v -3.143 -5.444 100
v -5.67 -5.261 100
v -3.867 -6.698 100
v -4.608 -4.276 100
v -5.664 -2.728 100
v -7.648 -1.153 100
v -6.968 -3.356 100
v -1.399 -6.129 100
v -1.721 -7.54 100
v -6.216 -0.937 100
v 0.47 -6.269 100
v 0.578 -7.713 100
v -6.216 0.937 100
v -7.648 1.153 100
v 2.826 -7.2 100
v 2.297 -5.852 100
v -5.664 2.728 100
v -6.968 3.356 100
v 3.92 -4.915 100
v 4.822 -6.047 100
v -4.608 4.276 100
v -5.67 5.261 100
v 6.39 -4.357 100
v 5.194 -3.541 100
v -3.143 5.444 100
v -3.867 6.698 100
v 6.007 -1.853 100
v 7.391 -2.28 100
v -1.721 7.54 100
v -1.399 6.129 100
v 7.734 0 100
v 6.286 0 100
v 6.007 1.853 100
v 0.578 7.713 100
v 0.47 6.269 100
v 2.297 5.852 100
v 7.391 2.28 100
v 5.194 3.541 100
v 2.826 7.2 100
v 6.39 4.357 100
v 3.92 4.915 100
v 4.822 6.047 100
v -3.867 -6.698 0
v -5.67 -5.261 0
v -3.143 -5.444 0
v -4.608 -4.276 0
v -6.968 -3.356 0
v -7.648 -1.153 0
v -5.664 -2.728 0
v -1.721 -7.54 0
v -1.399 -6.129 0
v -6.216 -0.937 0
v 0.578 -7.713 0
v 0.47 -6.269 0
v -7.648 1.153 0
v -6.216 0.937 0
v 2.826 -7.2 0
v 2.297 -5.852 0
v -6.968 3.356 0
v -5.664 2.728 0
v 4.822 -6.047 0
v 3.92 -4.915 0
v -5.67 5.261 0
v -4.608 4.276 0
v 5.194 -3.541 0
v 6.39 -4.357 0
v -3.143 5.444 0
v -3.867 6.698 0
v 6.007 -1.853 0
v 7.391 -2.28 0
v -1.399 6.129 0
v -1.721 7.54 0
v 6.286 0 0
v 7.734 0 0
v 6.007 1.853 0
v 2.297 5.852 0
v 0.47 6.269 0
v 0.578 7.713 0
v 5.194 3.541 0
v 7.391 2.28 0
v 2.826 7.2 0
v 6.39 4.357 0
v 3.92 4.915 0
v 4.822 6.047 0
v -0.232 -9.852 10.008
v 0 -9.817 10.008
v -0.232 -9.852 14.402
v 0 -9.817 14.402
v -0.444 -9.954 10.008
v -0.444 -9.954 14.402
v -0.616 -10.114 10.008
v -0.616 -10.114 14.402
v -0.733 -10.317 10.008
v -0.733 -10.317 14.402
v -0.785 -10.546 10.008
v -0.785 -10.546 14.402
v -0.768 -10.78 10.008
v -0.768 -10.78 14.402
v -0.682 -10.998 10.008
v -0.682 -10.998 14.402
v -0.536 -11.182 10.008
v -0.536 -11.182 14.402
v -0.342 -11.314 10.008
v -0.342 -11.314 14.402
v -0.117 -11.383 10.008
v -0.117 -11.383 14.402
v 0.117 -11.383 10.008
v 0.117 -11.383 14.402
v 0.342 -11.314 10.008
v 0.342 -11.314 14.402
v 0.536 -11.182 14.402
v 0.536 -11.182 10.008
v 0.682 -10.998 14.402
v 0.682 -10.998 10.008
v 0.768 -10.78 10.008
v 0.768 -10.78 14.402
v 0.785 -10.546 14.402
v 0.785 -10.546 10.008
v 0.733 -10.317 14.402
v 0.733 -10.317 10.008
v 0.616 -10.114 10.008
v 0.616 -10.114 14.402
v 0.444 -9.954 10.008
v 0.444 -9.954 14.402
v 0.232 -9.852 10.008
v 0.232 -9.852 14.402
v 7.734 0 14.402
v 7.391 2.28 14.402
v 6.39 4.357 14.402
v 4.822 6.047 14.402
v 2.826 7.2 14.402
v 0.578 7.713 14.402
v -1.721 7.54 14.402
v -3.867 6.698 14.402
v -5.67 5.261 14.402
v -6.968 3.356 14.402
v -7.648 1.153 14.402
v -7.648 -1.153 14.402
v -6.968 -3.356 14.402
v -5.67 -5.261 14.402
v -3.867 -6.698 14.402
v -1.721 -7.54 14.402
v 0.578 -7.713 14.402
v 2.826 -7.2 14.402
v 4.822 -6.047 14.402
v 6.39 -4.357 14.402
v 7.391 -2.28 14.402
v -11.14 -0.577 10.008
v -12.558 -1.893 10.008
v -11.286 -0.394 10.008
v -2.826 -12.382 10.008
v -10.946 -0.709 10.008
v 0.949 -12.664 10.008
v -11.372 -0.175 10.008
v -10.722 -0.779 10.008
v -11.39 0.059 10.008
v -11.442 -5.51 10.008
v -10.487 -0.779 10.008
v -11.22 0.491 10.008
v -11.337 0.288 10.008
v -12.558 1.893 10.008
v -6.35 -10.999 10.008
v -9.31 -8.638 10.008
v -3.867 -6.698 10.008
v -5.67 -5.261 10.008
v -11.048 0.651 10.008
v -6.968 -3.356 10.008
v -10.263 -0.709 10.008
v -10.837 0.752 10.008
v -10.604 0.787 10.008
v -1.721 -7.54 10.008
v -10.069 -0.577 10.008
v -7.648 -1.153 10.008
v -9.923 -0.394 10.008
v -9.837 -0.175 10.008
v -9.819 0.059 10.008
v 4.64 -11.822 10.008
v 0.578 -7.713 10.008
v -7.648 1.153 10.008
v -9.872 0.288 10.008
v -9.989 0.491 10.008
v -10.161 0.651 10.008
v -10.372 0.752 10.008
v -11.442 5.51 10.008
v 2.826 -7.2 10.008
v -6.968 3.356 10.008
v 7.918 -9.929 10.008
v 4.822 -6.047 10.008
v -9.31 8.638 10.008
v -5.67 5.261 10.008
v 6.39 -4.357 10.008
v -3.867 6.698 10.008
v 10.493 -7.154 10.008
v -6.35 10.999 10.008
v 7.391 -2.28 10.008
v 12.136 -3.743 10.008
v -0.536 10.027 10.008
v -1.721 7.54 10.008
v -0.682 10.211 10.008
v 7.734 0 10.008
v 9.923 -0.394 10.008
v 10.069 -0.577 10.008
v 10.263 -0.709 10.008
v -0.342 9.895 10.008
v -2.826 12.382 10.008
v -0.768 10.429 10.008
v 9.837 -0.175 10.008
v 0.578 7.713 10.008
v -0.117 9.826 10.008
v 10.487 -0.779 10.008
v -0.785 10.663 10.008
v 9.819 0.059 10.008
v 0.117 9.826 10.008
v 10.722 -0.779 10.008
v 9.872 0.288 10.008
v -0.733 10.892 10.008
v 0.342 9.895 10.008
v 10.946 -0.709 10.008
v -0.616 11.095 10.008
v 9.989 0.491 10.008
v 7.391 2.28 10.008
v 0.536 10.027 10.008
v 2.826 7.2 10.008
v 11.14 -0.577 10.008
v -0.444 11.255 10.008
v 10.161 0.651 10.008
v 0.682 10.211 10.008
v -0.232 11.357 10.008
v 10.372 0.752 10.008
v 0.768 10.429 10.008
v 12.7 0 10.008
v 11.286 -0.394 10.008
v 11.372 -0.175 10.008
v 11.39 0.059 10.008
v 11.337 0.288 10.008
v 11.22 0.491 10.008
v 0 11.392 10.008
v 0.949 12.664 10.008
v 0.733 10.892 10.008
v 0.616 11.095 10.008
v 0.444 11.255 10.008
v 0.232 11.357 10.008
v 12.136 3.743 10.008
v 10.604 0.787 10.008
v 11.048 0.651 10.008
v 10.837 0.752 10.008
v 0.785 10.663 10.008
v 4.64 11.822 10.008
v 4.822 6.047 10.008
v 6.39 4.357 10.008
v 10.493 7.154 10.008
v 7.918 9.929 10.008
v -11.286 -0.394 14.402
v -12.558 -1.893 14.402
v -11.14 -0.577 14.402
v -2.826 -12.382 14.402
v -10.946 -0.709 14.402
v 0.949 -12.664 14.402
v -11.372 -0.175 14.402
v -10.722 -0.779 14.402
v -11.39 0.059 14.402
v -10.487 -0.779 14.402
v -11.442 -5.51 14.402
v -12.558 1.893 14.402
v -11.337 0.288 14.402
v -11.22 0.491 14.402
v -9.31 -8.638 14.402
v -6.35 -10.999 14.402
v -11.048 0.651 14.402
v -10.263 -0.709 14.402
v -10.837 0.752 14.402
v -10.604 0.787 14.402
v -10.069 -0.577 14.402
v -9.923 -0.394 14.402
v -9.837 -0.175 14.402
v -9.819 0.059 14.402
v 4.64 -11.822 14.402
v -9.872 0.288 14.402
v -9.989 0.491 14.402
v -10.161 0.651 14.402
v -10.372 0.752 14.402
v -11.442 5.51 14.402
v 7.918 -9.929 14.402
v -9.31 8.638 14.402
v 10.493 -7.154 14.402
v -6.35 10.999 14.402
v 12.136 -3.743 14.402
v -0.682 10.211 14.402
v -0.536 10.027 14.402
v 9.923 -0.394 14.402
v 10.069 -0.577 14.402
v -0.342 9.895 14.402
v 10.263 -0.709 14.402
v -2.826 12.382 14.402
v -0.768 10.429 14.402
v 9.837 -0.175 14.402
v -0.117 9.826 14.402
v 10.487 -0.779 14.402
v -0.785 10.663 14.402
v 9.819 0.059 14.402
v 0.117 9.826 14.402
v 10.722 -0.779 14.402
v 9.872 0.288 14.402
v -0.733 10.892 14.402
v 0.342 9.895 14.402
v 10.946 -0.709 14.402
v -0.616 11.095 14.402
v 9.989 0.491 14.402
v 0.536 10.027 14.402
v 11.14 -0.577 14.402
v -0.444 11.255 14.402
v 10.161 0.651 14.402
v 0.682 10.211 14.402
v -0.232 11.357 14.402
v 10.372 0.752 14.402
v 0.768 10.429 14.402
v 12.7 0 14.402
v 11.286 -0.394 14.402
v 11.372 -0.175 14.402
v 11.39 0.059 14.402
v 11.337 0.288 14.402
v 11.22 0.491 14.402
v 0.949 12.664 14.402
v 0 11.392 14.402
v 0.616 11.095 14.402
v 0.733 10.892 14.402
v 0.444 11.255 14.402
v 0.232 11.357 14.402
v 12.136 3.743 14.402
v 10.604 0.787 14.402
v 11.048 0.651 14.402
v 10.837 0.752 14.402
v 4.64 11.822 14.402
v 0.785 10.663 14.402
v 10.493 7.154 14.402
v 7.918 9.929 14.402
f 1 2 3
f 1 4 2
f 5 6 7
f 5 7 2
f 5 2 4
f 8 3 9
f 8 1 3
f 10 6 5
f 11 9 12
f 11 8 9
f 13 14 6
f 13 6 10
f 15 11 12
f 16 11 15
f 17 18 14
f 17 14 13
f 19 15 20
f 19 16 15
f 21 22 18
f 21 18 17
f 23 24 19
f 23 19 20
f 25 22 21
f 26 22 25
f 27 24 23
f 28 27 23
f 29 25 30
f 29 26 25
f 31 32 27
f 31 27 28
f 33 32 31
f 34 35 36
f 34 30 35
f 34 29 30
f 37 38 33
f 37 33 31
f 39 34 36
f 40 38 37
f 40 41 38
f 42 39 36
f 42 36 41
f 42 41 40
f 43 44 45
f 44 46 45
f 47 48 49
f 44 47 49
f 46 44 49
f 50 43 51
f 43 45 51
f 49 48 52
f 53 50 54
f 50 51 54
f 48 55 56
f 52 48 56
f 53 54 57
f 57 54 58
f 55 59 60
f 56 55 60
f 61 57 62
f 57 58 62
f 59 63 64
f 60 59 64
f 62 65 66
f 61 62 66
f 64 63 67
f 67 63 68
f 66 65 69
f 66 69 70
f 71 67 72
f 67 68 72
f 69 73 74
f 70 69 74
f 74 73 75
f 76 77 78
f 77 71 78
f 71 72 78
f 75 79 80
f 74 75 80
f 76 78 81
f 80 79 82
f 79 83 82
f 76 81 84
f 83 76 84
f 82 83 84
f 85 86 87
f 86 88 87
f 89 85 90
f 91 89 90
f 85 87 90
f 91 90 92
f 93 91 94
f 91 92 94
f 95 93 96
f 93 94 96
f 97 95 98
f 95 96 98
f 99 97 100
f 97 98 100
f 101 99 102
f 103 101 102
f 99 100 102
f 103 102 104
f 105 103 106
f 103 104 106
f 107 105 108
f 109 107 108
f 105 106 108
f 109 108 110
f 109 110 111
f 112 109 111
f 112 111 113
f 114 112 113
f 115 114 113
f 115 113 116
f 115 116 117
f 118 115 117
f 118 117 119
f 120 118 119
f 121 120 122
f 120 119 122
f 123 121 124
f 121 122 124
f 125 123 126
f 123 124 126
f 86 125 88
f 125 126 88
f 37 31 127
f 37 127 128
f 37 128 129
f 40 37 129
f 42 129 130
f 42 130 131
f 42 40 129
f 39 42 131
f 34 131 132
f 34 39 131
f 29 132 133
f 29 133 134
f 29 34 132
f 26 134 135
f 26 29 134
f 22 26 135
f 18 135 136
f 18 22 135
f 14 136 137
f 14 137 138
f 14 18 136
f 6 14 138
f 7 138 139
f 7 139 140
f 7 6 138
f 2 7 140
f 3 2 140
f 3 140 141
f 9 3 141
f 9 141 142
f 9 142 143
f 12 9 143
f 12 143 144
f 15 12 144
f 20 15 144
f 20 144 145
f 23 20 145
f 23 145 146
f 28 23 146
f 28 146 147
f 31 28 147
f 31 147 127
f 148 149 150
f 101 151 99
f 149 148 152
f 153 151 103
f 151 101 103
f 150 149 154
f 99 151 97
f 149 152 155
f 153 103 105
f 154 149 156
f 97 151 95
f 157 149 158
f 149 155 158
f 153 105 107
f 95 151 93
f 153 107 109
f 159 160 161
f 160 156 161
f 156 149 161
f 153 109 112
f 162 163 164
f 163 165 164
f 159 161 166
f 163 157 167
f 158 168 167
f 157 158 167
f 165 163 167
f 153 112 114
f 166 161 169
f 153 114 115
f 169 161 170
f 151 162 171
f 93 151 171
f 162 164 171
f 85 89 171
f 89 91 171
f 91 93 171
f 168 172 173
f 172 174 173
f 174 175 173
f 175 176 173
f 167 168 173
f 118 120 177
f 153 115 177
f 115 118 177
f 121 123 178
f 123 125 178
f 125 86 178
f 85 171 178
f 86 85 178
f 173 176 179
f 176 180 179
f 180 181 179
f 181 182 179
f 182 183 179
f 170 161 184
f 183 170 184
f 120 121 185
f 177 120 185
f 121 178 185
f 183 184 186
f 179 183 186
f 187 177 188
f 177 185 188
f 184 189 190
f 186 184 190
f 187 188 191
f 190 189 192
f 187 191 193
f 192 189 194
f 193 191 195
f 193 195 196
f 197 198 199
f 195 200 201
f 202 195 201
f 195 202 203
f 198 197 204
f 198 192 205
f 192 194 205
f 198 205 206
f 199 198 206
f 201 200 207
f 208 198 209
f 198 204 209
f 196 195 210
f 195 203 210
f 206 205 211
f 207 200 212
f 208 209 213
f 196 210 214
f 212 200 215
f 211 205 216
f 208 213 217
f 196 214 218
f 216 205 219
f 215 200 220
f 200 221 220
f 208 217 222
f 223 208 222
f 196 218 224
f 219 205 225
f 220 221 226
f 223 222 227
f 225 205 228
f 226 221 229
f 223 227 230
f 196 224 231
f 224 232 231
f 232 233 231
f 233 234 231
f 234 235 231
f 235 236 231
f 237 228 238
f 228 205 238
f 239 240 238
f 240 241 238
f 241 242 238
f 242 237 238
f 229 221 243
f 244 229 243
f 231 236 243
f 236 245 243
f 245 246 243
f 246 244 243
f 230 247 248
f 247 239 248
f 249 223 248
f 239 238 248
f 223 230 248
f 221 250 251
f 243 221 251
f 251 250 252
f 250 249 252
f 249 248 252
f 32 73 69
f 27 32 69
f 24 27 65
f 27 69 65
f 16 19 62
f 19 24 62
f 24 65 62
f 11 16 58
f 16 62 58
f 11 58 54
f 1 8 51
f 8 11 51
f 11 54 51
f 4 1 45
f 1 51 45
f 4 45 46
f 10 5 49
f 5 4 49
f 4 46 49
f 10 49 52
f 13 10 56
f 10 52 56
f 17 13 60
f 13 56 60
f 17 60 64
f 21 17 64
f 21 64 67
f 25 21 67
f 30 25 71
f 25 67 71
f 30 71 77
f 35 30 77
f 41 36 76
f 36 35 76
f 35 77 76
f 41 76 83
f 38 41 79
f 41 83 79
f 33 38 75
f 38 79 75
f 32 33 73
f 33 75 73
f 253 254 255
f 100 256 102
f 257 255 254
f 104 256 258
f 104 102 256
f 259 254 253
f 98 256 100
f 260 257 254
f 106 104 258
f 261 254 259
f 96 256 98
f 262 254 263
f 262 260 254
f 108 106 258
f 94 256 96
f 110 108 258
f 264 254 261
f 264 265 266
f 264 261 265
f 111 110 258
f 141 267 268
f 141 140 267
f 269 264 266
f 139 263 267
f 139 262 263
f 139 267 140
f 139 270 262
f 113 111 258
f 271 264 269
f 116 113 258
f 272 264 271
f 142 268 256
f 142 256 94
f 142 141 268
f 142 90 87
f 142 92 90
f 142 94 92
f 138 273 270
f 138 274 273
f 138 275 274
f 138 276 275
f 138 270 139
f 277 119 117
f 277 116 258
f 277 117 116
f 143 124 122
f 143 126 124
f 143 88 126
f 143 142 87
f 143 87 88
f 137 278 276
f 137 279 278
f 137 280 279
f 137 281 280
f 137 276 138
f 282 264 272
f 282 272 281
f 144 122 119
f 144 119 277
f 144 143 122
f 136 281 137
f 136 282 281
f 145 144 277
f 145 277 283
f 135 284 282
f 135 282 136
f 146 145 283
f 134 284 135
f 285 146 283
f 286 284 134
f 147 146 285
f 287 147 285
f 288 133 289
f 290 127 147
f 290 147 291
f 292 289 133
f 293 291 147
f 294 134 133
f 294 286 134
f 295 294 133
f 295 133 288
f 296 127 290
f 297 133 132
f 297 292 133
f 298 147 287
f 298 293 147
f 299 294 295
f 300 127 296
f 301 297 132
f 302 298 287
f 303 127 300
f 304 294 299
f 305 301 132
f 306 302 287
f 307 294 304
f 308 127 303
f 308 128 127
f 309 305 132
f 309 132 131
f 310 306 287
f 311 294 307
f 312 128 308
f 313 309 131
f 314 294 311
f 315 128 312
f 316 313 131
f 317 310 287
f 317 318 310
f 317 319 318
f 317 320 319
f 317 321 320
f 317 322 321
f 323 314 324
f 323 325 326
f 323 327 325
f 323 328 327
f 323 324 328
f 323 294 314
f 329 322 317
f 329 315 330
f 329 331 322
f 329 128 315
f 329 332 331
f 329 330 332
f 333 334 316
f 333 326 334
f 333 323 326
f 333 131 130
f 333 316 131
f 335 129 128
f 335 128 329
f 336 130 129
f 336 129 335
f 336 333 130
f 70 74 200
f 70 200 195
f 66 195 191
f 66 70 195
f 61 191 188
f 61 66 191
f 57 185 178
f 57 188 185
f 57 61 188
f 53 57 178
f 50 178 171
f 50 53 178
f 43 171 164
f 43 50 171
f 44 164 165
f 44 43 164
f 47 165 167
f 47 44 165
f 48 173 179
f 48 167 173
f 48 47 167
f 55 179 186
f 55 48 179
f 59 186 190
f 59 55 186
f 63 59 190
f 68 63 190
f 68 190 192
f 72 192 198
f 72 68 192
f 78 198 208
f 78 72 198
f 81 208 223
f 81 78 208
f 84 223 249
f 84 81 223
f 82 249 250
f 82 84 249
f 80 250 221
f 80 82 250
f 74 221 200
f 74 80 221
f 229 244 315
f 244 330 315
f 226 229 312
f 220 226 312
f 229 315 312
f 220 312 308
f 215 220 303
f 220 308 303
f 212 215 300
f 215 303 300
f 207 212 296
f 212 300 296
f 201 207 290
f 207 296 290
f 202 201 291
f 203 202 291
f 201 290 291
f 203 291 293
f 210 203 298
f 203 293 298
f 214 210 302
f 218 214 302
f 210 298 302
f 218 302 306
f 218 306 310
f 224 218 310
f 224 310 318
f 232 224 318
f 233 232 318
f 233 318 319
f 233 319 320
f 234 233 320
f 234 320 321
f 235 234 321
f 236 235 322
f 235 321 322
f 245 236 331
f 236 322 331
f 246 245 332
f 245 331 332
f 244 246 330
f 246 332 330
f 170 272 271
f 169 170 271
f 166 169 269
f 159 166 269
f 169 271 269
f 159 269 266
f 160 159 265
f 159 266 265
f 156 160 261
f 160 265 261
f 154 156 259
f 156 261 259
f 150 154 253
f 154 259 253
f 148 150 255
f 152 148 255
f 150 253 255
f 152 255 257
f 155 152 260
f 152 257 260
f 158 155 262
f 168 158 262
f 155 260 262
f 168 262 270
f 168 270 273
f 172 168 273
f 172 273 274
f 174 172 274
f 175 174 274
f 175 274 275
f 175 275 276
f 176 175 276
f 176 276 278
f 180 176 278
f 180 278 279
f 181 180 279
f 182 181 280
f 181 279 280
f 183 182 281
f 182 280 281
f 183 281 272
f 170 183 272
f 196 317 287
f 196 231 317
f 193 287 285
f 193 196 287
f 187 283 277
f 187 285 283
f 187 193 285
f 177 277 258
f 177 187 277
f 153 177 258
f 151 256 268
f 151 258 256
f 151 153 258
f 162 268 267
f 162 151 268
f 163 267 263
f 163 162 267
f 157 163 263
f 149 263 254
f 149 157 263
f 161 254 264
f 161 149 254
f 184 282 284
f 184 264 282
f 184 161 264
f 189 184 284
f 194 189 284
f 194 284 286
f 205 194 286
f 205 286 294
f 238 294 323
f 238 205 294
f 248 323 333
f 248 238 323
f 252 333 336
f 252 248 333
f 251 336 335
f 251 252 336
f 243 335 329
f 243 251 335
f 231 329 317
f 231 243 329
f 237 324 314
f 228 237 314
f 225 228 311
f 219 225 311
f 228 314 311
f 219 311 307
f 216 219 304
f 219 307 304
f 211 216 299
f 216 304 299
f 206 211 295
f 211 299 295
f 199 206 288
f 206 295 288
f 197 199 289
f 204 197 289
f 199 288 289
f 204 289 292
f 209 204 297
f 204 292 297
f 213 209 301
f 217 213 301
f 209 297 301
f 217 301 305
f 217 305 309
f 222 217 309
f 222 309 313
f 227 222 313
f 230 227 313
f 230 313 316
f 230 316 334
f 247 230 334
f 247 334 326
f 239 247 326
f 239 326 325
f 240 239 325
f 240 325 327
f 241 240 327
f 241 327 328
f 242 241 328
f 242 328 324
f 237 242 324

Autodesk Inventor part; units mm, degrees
ref_plane "YZ Plane" through (0, 0, 0) normal (1, 0, 0) x (0, 1, 0)
ref_plane "XZ Plane" through (0, 0, 0) normal (0, 1, 0) x (-1, 0, 0)
ref_plane "XY Plane" through (0, 0, 0) normal (0, 0, 1) x (1, 0, 0)
sketch "Sketch1" plane through (0, 0, 0) normal (0, 0, 1) x (1, 0, 0)
  circle A0 centre (0, 0) radius 6.2865
  circle A1 centre (0, 0) radius 7.7343
  circle A2 centre (0, 0) radius 12.7
  dimension "d0" = 12.573
  dimension "d1" = 15.4686
  dimension "d4" = 25.4
extrude "Extrusion2" add sketch "Sketch1" along normal blind 100 contours A1 | A2
extrude "Extrusion3" cut sketch "Sketch1" along normal blind 10.0076 contours A2
sketch "Sketch3" plane through (0, 0, 100) normal (0, 0, 1) x (1, 0, 0)
  circle A0 centre (0, 0) radius 12.7 projected
  circle A1 centre (0, 0) radius 7.7343 projected
  circle A2 centre (0, 0) radius 6.2865 projected
  circle A3 centre (0, 0) radius 6.2865 projected
  circle A4 centre (0, 0) radius 6.2865 projected
extrude "Extrusion4" cut sketch "Sketch3" against normal blind 85.598 contours A0
sketch "Sketch4" plane through (0, 0, 10.0076) normal (0, 0, -1) x (-1, 0, 0)
  circle A0 centre (0, 0) radius 10.6045 construction
  point P0 (0, 10.6045)
  point P1 (0, -10.6045)
  point P2 (-10.6045, 0)
  point P3 (10.6045, 0)
  dimension "d11" = 21.209
hole "Hole1" at (0, 10.6045, 10.0076) at (10.6045, 0, 10.0076) at (-10.6045, 0, 10.0076) at (0, -10.6045, 10.0076) direction (0, 0, 1) diameter 1.5748 depth 6.2992 tip angle 118
sketch "Sketch5" plane through (0, 0, 10.0076) normal (0, 0, -1) x (-1, 0, 0)
  point P0 (0, 0)
sketch "Sketch6" plane through (0, 0, 10.0076) normal (0, 0, -1) x (-1, 0, 0)
  circle A0 centre (0, 10.6045) radius 0.7874 construction
  line L0 (0, 10.6045) -> (0, 12.7) construction
  circle A1 centre (0, 0) radius 12.7 construction
properties part number "waveguide"
